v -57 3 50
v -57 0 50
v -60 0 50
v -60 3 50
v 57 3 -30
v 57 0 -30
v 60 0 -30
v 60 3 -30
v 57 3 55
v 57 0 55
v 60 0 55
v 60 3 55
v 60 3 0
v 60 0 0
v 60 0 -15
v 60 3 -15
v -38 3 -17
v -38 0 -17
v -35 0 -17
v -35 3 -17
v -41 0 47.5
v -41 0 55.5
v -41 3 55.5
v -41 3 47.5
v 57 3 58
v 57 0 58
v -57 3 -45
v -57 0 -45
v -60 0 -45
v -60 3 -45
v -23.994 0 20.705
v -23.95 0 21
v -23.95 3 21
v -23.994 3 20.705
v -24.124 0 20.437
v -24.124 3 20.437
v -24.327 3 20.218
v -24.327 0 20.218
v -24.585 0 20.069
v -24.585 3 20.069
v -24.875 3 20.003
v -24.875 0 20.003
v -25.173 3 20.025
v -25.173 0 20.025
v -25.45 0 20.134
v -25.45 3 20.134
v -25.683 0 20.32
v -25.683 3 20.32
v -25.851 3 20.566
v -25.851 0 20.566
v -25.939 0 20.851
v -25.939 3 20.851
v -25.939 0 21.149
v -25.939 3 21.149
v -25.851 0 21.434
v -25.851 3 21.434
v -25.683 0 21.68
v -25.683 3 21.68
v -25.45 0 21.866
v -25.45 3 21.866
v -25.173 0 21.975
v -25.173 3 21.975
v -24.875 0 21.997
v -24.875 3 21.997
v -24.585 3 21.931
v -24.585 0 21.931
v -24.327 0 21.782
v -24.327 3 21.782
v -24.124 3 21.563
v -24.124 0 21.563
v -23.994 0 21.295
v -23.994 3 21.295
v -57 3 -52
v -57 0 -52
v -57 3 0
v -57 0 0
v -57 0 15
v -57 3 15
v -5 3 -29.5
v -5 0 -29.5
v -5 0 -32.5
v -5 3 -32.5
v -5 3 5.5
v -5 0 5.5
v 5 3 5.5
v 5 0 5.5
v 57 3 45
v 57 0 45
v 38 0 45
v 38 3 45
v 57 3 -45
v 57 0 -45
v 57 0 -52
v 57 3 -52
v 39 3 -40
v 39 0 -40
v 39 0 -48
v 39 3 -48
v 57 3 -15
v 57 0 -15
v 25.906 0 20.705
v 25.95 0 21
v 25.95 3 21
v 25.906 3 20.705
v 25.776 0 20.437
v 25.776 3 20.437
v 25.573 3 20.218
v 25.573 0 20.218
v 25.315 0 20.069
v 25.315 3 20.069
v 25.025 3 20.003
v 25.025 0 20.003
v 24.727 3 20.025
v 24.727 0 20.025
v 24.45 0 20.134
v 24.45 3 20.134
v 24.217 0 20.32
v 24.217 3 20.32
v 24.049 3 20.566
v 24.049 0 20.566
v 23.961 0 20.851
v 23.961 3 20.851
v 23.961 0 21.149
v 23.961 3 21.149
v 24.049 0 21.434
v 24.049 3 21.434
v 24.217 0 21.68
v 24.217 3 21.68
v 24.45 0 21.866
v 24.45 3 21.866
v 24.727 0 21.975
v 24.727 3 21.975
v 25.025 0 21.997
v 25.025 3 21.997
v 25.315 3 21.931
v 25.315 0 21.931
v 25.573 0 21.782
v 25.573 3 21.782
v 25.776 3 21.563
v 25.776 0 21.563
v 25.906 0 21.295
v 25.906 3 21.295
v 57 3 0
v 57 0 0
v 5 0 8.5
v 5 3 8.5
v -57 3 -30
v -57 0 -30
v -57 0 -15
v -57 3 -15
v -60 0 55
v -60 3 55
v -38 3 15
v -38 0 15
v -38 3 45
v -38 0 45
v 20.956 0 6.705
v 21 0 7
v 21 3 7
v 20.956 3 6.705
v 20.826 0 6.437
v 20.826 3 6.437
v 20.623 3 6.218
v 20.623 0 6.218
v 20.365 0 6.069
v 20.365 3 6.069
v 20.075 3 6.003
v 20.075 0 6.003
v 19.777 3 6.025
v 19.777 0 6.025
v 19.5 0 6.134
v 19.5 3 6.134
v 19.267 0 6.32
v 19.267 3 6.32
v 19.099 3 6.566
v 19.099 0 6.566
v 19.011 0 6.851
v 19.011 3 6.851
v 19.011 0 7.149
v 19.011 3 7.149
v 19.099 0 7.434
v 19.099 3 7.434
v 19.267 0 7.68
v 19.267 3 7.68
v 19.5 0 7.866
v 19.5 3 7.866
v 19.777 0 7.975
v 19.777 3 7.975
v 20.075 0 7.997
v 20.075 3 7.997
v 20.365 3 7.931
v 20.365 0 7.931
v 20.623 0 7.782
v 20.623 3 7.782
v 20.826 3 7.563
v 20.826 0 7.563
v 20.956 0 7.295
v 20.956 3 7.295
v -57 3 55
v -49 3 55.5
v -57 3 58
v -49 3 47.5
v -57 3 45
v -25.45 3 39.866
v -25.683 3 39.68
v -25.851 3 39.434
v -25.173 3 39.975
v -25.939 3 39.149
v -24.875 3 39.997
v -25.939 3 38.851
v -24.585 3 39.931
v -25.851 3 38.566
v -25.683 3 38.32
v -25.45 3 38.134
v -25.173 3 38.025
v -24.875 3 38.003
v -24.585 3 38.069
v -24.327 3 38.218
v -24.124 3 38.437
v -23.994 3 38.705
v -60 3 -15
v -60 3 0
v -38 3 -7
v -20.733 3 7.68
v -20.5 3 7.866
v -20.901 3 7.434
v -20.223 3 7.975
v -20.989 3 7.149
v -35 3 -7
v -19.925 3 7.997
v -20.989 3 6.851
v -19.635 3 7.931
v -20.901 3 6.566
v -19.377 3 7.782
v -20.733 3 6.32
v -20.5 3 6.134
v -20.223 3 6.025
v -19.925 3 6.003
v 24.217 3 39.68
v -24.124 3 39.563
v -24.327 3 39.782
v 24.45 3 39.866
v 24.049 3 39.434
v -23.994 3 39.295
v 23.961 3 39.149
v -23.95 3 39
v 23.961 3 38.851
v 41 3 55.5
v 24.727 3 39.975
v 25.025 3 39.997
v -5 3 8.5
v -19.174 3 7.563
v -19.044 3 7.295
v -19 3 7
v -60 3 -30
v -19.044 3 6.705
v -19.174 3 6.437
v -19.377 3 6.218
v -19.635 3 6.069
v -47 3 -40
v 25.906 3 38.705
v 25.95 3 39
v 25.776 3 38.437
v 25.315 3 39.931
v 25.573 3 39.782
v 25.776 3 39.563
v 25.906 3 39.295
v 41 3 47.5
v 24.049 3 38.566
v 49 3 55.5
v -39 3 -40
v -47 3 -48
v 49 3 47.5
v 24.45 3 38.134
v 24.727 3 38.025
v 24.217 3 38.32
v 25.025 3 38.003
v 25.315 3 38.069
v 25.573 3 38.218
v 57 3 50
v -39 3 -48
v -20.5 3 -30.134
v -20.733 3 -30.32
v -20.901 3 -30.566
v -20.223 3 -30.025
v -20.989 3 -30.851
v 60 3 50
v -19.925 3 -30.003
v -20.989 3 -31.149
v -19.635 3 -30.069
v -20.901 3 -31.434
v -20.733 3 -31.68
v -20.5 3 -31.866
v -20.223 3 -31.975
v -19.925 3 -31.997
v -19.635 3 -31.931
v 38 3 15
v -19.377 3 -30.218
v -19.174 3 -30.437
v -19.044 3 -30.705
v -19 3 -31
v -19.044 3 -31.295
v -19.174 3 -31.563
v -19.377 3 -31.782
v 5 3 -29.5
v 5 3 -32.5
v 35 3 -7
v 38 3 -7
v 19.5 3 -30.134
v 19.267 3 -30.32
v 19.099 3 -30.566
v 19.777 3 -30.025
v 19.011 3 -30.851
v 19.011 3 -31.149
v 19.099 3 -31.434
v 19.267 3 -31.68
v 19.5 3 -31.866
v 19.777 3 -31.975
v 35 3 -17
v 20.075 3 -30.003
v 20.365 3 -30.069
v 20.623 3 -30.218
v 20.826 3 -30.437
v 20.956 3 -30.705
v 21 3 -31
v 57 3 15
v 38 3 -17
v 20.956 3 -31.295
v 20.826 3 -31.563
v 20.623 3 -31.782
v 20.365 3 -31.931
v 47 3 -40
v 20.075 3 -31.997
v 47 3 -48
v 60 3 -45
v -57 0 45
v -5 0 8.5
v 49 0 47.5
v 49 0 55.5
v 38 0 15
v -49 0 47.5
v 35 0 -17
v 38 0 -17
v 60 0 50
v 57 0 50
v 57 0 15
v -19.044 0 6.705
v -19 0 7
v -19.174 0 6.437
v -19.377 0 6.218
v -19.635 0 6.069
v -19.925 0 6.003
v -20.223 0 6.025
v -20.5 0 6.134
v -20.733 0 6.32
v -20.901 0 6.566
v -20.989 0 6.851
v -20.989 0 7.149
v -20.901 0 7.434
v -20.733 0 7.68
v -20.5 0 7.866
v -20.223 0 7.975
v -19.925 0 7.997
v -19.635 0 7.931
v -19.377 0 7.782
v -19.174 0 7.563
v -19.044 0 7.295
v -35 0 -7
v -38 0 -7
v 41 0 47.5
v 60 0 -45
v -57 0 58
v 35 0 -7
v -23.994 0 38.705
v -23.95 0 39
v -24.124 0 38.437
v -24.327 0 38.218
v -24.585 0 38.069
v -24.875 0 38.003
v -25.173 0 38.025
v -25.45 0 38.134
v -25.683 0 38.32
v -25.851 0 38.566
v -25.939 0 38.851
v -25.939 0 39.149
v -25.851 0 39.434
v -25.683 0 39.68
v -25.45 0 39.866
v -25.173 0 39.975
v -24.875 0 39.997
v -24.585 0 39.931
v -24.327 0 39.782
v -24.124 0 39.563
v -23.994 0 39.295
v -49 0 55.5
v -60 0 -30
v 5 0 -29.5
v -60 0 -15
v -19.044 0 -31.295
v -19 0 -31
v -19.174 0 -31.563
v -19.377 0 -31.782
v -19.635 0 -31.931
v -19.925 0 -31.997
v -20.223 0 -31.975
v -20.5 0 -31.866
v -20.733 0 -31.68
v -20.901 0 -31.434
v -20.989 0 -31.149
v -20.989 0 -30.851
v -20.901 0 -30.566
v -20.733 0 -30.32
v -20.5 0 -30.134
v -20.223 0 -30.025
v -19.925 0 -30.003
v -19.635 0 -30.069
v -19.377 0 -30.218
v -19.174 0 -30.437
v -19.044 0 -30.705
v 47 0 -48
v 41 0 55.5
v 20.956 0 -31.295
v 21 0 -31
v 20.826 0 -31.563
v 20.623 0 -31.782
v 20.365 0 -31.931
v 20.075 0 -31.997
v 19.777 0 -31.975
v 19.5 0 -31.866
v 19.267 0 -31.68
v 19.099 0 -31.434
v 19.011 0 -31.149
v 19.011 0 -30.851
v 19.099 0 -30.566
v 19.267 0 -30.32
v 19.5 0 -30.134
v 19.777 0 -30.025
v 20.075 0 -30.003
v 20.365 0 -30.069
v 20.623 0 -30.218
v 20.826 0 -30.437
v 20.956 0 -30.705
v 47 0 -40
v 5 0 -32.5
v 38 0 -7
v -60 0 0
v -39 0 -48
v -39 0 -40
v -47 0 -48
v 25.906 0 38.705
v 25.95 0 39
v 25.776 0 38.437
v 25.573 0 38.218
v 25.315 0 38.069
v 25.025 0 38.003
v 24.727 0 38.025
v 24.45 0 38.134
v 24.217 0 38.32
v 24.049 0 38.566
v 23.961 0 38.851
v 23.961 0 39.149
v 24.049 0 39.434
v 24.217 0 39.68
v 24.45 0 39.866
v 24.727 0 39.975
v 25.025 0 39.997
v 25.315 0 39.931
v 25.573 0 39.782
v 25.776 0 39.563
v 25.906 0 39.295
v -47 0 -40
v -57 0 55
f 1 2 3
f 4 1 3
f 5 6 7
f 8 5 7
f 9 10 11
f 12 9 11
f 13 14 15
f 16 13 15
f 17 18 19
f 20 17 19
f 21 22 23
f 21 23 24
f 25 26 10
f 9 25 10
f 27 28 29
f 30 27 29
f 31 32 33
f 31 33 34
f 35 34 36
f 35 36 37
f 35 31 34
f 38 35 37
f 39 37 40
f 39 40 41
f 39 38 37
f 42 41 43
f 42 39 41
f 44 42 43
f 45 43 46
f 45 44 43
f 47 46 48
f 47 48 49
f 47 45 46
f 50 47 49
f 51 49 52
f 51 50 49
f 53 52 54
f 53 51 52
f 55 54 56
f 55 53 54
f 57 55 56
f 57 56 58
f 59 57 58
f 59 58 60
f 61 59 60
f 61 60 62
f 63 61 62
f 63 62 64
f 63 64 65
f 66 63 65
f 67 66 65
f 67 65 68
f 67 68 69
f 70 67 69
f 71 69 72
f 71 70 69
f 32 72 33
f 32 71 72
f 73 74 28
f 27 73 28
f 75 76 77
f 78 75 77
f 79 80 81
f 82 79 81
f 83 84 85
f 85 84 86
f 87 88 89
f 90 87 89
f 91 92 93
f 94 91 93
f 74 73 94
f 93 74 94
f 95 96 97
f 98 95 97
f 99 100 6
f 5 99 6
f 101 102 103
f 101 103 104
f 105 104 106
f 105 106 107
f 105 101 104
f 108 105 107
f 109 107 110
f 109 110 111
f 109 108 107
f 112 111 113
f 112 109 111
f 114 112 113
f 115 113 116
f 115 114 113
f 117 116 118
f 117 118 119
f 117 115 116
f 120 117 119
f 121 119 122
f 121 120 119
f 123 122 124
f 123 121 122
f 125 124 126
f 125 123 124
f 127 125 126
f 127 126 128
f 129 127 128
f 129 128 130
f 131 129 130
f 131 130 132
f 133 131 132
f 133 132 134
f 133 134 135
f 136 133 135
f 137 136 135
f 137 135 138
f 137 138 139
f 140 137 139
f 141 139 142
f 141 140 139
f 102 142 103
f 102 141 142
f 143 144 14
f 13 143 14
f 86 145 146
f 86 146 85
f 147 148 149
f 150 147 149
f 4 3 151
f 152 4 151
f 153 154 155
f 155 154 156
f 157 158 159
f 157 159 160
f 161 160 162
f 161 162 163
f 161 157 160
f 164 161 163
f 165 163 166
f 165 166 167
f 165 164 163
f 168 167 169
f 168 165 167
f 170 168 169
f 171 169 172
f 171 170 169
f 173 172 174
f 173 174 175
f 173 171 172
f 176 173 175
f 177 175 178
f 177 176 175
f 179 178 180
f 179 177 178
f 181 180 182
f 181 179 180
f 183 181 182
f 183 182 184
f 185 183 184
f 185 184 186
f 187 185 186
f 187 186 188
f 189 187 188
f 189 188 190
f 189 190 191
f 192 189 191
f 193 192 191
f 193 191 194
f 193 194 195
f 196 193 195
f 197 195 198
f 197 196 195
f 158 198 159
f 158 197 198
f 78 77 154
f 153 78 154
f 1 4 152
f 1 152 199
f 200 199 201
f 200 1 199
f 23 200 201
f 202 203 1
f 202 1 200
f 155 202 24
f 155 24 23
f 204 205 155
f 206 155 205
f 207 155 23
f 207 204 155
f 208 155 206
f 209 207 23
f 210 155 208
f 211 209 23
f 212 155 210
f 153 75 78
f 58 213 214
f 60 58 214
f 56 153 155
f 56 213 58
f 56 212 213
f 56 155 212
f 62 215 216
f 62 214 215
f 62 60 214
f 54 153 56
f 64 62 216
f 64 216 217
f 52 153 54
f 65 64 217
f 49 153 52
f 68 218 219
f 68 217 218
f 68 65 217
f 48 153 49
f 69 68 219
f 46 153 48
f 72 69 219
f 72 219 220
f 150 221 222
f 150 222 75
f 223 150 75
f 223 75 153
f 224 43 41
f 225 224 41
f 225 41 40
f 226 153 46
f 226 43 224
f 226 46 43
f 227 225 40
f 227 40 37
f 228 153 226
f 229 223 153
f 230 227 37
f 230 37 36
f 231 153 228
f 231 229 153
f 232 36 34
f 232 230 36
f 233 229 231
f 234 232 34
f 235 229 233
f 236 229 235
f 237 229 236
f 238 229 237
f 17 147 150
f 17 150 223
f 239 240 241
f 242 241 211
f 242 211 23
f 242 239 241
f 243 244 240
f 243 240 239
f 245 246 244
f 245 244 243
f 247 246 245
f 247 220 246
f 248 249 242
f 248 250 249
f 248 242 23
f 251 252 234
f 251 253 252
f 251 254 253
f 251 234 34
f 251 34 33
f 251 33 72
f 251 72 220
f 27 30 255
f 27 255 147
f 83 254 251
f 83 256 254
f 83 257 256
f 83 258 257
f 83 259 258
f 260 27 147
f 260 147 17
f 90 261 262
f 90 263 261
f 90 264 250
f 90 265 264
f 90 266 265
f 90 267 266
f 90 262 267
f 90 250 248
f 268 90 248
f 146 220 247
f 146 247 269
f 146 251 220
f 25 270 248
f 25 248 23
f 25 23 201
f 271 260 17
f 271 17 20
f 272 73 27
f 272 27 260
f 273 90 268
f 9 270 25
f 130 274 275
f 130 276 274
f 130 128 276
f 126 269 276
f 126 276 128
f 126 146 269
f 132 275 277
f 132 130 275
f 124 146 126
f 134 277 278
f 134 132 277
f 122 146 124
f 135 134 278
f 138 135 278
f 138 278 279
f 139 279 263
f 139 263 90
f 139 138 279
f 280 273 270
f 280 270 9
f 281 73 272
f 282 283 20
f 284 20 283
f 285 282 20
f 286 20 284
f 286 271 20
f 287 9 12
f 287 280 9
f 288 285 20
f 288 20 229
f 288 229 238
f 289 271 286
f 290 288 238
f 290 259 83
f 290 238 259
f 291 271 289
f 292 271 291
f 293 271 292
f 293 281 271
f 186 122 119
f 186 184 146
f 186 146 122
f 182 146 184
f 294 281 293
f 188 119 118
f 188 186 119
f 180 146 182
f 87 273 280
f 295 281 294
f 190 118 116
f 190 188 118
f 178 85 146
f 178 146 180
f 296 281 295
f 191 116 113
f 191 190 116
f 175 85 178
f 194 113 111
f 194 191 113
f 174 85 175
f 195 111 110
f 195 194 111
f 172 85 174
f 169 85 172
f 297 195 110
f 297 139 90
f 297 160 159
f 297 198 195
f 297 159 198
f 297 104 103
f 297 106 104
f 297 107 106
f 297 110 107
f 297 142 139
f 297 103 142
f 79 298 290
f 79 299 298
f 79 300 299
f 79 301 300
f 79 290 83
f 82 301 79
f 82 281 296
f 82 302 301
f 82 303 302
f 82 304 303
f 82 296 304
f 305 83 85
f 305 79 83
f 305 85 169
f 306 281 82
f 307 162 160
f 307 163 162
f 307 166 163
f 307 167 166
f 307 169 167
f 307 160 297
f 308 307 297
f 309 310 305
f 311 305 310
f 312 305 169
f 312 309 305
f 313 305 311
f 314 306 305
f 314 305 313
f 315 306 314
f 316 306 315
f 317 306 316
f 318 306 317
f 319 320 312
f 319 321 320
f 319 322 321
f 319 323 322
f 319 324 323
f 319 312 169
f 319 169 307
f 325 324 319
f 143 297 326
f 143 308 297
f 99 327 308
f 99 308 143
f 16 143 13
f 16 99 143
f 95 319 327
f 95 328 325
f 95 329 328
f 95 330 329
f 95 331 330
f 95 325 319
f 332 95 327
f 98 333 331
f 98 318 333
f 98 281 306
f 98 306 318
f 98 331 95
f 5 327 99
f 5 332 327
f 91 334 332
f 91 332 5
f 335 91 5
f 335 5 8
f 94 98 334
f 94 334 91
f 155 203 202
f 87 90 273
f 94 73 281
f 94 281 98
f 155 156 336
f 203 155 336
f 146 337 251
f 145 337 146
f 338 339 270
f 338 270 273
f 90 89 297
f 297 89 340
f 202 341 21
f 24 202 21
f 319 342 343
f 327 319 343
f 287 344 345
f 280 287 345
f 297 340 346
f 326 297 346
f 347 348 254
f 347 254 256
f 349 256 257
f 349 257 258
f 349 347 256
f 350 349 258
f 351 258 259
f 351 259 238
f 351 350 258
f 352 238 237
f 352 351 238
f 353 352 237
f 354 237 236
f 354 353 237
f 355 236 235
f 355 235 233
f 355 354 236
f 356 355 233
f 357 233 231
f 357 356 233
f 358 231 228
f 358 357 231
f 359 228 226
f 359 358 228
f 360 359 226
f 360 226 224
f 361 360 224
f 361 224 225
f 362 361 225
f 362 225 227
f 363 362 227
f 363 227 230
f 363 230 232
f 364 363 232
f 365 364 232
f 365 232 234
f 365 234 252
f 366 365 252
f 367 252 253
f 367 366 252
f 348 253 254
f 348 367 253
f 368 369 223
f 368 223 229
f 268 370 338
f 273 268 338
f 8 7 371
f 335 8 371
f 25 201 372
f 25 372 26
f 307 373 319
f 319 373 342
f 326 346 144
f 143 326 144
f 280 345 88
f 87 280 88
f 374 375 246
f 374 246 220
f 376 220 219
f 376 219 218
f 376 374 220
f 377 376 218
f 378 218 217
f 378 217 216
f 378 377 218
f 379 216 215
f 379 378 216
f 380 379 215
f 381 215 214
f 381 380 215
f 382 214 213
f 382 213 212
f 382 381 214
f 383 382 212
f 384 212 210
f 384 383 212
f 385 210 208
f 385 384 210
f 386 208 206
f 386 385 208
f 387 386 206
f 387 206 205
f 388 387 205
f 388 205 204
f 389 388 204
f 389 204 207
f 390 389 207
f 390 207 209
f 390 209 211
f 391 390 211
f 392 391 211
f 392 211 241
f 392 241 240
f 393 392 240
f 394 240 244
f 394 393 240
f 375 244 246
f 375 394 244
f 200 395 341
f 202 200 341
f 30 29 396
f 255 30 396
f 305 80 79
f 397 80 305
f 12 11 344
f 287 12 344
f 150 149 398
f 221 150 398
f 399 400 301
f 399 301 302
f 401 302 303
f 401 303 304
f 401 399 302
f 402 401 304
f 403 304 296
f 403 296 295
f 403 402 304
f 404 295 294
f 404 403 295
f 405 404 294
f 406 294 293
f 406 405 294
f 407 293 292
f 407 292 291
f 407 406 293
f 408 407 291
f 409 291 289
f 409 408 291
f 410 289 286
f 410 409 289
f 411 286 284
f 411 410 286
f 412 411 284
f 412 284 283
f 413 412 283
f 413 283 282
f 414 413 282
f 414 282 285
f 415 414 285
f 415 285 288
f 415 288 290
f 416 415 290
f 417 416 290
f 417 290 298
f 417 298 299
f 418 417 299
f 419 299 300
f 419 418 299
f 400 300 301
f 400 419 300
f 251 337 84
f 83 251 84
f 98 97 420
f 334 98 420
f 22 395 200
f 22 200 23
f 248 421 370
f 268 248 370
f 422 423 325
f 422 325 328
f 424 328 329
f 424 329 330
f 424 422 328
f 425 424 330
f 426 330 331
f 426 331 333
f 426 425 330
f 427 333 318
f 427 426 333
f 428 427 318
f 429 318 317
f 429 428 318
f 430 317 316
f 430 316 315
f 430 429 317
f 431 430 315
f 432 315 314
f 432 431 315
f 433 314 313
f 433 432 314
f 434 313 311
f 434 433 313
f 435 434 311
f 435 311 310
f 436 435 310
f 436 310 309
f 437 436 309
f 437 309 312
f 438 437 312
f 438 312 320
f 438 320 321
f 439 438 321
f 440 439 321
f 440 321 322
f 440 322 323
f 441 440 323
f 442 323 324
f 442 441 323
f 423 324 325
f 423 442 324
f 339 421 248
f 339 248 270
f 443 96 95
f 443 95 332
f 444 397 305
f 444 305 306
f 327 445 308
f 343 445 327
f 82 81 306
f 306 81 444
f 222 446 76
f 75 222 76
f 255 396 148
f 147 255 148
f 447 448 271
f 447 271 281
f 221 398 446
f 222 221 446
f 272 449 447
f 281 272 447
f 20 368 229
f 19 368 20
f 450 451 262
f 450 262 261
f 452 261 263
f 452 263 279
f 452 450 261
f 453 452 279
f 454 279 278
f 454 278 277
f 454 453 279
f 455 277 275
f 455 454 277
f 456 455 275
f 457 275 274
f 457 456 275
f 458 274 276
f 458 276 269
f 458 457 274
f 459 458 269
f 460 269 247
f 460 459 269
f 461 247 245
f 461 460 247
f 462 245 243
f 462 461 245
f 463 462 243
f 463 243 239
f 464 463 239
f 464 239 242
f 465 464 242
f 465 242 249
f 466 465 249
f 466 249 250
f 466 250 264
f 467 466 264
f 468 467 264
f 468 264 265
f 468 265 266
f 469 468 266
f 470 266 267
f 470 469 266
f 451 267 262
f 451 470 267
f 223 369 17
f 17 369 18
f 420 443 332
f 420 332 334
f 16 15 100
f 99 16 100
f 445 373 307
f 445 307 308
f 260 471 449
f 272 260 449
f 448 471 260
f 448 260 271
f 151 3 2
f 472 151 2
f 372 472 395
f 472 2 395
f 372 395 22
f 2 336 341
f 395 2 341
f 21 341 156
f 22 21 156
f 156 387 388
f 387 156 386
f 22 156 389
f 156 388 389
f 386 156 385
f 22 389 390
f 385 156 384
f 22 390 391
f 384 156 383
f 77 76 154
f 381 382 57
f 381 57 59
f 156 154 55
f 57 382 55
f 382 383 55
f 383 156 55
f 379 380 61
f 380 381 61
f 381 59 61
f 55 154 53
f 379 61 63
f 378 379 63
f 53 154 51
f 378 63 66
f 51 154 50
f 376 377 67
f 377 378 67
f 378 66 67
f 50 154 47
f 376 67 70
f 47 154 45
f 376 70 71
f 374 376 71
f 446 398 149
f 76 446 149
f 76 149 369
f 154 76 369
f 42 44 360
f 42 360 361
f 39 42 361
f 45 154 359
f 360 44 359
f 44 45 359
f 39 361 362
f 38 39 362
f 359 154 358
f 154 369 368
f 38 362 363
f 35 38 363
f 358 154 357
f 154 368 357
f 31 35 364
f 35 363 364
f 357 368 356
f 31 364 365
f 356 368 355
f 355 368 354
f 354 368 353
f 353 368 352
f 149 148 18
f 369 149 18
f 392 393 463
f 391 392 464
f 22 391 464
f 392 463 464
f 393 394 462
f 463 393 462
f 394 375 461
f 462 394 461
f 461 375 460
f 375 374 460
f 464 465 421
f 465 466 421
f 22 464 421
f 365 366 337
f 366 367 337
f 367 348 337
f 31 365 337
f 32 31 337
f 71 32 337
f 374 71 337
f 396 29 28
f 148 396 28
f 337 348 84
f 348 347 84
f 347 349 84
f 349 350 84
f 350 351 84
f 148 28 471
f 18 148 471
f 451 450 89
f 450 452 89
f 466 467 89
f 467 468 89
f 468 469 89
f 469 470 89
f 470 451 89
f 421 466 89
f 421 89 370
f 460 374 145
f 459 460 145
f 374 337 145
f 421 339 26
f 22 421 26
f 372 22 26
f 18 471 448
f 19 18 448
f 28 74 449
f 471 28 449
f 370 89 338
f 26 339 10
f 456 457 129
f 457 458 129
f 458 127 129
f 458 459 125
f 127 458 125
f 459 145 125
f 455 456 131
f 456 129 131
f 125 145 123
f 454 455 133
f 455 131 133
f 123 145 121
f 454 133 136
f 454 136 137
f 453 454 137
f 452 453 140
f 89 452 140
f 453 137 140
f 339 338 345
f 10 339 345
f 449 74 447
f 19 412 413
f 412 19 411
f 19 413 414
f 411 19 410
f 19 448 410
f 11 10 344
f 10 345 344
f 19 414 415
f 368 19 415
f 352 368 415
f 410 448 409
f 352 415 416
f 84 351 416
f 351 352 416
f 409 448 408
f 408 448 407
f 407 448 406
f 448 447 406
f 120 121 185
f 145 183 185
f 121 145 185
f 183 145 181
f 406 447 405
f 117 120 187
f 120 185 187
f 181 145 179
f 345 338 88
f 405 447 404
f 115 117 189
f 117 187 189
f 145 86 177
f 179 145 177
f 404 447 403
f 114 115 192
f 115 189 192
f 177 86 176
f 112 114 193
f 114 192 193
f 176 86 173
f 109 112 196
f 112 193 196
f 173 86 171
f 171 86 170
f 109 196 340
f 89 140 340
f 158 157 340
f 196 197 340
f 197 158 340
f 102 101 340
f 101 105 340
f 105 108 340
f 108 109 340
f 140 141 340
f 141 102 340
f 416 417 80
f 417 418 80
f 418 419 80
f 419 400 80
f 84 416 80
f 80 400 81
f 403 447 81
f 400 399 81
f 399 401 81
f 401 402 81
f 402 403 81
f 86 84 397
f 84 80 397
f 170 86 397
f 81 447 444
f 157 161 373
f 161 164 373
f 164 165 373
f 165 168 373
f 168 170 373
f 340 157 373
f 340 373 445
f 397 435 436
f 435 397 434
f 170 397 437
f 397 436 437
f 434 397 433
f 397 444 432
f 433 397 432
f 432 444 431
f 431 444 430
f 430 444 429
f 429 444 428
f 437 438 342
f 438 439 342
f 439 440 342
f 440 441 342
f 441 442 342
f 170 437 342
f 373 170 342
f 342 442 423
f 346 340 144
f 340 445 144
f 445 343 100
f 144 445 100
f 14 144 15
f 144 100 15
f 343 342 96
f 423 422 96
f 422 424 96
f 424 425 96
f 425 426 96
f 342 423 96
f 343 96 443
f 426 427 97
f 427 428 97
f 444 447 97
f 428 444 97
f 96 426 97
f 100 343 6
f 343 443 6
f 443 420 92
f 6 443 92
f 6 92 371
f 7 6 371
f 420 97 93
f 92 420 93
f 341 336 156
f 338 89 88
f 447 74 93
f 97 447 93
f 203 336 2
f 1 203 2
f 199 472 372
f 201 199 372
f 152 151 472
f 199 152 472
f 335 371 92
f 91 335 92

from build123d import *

# Parameters (mm, degrees)
CROQUIS1_W              = 8
CROQUIS1_H              = 8
CROQUIS1_R              = 1
CROQUIS1_W_2            = 10
CROQUIS1_H_2            = 3
CROQUIS1_W_3            = 3
CROQUIS1_H_3            = 10
SALIENTE_EXTRUIR1_DEPTH = 3
CROQUIS2_W              = 114
CROQUIS2_H              = 8
CORTAR_EXTRUIR1_DEPTH   = 4
CROQUIS3_W              = 114
CROQUIS3_H              = 2
CORTAR_EXTRUIR2_DEPTH   = 4


with BuildPart() as part:
    # Croquis1 → Saliente-Extruir1 (new body)
    with BuildSketch(Plane(origin=(0, 0, 0), x_dir=(1, 0, 0), z_dir=(0, 1, 0))):
        Polygon((-57, 0), (-57, -15), (-38, -15), (-38, -45), (-57, -45), (-57, -50), (-60, -50), (-60, -55), (-57, -55), (-57, -60), (57, -60), (57, -55), (60, -55), (60, -50), (57, -50), (57, -45), (38, -45), (38, -15), (57, -15), (57, 0), (60, 0), (60, 15), (57, 15), (57, 30), (60, 30), (60, 45), (57, 45), (57, 60), (-57, 60), (-57, 45), (-60, 45), (-60, 30), (-57, 30), (-57, 15), (-60, 15), (-60, 0), align=None)
        with Locations((-45, -51.5)):
            Rectangle(CROQUIS1_W, CROQUIS1_H, mode=Mode.SUBTRACT)
        with Locations((-24.95, -39)):
            Circle(CROQUIS1_R, mode=Mode.SUBTRACT)
        with Locations((-24.95, -21)):
            Circle(CROQUIS1_R, mode=Mode.SUBTRACT)
        with Locations((-20, -7)):
            Circle(CROQUIS1_R, mode=Mode.SUBTRACT)
        with Locations((24.95, -39)):
            Circle(CROQUIS1_R, mode=Mode.SUBTRACT)
        with Locations((45, -51.5)):
            Rectangle(CROQUIS1_W, CROQUIS1_H, mode=Mode.SUBTRACT)
        with Locations((24.95, -21)):
            Circle(CROQUIS1_R, mode=Mode.SUBTRACT)
        with Locations((0, -7)):
            Rectangle(CROQUIS1_W_2, CROQUIS1_H_2, mode=Mode.SUBTRACT)
        with Locations((20, -7)):
            Circle(CROQUIS1_R, mode=Mode.SUBTRACT)
        with Locations((-36.5, 12)):
            Rectangle(CROQUIS1_W_3, CROQUIS1_H_3, mode=Mode.SUBTRACT)
        with Locations((-43, 44)):
            Rectangle(CROQUIS1_W, CROQUIS1_H, mode=Mode.SUBTRACT)
        with Locations((-20, 31)):
            Circle(CROQUIS1_R, mode=Mode.SUBTRACT)
        with Locations((36.5, 12)):
            Rectangle(CROQUIS1_W_3, CROQUIS1_H_3, mode=Mode.SUBTRACT)
        with Locations((0, 31)):
            Rectangle(CROQUIS1_W_2, CROQUIS1_H_2, mode=Mode.SUBTRACT)
        with Locations((20, 31)):
            Circle(CROQUIS1_R, mode=Mode.SUBTRACT)
        with Locations((43, 44)):
            Rectangle(CROQUIS1_W, CROQUIS1_H, mode=Mode.SUBTRACT)
    extrude(amount=SALIENTE_EXTRUIR1_DEPTH)

    # Croquis2 → Cortar-Extruir1 (cut, through all)
    with BuildSketch(Plane(origin=(0, 3, 0), x_dir=(1, 0, 0), z_dir=(0, 1, 0))):
        with Locations((0, 56)):
            Rectangle(CROQUIS2_W, CROQUIS2_H)
    extrude(amount=-CORTAR_EXTRUIR1_DEPTH, mode=Mode.SUBTRACT)

    # Croquis3 → Cortar-Extruir2 (cut, through all)
    with BuildSketch(Plane(origin=(0, 3, 0), x_dir=(1, 0, 0), z_dir=(0, 1, 0))):
        with Locations((0, -59)):
            Rectangle(CROQUIS3_W, CROQUIS3_H)
    extrude(amount=-CORTAR_EXTRUIR2_DEPTH, mode=Mode.SUBTRACT)


solid = part.part
